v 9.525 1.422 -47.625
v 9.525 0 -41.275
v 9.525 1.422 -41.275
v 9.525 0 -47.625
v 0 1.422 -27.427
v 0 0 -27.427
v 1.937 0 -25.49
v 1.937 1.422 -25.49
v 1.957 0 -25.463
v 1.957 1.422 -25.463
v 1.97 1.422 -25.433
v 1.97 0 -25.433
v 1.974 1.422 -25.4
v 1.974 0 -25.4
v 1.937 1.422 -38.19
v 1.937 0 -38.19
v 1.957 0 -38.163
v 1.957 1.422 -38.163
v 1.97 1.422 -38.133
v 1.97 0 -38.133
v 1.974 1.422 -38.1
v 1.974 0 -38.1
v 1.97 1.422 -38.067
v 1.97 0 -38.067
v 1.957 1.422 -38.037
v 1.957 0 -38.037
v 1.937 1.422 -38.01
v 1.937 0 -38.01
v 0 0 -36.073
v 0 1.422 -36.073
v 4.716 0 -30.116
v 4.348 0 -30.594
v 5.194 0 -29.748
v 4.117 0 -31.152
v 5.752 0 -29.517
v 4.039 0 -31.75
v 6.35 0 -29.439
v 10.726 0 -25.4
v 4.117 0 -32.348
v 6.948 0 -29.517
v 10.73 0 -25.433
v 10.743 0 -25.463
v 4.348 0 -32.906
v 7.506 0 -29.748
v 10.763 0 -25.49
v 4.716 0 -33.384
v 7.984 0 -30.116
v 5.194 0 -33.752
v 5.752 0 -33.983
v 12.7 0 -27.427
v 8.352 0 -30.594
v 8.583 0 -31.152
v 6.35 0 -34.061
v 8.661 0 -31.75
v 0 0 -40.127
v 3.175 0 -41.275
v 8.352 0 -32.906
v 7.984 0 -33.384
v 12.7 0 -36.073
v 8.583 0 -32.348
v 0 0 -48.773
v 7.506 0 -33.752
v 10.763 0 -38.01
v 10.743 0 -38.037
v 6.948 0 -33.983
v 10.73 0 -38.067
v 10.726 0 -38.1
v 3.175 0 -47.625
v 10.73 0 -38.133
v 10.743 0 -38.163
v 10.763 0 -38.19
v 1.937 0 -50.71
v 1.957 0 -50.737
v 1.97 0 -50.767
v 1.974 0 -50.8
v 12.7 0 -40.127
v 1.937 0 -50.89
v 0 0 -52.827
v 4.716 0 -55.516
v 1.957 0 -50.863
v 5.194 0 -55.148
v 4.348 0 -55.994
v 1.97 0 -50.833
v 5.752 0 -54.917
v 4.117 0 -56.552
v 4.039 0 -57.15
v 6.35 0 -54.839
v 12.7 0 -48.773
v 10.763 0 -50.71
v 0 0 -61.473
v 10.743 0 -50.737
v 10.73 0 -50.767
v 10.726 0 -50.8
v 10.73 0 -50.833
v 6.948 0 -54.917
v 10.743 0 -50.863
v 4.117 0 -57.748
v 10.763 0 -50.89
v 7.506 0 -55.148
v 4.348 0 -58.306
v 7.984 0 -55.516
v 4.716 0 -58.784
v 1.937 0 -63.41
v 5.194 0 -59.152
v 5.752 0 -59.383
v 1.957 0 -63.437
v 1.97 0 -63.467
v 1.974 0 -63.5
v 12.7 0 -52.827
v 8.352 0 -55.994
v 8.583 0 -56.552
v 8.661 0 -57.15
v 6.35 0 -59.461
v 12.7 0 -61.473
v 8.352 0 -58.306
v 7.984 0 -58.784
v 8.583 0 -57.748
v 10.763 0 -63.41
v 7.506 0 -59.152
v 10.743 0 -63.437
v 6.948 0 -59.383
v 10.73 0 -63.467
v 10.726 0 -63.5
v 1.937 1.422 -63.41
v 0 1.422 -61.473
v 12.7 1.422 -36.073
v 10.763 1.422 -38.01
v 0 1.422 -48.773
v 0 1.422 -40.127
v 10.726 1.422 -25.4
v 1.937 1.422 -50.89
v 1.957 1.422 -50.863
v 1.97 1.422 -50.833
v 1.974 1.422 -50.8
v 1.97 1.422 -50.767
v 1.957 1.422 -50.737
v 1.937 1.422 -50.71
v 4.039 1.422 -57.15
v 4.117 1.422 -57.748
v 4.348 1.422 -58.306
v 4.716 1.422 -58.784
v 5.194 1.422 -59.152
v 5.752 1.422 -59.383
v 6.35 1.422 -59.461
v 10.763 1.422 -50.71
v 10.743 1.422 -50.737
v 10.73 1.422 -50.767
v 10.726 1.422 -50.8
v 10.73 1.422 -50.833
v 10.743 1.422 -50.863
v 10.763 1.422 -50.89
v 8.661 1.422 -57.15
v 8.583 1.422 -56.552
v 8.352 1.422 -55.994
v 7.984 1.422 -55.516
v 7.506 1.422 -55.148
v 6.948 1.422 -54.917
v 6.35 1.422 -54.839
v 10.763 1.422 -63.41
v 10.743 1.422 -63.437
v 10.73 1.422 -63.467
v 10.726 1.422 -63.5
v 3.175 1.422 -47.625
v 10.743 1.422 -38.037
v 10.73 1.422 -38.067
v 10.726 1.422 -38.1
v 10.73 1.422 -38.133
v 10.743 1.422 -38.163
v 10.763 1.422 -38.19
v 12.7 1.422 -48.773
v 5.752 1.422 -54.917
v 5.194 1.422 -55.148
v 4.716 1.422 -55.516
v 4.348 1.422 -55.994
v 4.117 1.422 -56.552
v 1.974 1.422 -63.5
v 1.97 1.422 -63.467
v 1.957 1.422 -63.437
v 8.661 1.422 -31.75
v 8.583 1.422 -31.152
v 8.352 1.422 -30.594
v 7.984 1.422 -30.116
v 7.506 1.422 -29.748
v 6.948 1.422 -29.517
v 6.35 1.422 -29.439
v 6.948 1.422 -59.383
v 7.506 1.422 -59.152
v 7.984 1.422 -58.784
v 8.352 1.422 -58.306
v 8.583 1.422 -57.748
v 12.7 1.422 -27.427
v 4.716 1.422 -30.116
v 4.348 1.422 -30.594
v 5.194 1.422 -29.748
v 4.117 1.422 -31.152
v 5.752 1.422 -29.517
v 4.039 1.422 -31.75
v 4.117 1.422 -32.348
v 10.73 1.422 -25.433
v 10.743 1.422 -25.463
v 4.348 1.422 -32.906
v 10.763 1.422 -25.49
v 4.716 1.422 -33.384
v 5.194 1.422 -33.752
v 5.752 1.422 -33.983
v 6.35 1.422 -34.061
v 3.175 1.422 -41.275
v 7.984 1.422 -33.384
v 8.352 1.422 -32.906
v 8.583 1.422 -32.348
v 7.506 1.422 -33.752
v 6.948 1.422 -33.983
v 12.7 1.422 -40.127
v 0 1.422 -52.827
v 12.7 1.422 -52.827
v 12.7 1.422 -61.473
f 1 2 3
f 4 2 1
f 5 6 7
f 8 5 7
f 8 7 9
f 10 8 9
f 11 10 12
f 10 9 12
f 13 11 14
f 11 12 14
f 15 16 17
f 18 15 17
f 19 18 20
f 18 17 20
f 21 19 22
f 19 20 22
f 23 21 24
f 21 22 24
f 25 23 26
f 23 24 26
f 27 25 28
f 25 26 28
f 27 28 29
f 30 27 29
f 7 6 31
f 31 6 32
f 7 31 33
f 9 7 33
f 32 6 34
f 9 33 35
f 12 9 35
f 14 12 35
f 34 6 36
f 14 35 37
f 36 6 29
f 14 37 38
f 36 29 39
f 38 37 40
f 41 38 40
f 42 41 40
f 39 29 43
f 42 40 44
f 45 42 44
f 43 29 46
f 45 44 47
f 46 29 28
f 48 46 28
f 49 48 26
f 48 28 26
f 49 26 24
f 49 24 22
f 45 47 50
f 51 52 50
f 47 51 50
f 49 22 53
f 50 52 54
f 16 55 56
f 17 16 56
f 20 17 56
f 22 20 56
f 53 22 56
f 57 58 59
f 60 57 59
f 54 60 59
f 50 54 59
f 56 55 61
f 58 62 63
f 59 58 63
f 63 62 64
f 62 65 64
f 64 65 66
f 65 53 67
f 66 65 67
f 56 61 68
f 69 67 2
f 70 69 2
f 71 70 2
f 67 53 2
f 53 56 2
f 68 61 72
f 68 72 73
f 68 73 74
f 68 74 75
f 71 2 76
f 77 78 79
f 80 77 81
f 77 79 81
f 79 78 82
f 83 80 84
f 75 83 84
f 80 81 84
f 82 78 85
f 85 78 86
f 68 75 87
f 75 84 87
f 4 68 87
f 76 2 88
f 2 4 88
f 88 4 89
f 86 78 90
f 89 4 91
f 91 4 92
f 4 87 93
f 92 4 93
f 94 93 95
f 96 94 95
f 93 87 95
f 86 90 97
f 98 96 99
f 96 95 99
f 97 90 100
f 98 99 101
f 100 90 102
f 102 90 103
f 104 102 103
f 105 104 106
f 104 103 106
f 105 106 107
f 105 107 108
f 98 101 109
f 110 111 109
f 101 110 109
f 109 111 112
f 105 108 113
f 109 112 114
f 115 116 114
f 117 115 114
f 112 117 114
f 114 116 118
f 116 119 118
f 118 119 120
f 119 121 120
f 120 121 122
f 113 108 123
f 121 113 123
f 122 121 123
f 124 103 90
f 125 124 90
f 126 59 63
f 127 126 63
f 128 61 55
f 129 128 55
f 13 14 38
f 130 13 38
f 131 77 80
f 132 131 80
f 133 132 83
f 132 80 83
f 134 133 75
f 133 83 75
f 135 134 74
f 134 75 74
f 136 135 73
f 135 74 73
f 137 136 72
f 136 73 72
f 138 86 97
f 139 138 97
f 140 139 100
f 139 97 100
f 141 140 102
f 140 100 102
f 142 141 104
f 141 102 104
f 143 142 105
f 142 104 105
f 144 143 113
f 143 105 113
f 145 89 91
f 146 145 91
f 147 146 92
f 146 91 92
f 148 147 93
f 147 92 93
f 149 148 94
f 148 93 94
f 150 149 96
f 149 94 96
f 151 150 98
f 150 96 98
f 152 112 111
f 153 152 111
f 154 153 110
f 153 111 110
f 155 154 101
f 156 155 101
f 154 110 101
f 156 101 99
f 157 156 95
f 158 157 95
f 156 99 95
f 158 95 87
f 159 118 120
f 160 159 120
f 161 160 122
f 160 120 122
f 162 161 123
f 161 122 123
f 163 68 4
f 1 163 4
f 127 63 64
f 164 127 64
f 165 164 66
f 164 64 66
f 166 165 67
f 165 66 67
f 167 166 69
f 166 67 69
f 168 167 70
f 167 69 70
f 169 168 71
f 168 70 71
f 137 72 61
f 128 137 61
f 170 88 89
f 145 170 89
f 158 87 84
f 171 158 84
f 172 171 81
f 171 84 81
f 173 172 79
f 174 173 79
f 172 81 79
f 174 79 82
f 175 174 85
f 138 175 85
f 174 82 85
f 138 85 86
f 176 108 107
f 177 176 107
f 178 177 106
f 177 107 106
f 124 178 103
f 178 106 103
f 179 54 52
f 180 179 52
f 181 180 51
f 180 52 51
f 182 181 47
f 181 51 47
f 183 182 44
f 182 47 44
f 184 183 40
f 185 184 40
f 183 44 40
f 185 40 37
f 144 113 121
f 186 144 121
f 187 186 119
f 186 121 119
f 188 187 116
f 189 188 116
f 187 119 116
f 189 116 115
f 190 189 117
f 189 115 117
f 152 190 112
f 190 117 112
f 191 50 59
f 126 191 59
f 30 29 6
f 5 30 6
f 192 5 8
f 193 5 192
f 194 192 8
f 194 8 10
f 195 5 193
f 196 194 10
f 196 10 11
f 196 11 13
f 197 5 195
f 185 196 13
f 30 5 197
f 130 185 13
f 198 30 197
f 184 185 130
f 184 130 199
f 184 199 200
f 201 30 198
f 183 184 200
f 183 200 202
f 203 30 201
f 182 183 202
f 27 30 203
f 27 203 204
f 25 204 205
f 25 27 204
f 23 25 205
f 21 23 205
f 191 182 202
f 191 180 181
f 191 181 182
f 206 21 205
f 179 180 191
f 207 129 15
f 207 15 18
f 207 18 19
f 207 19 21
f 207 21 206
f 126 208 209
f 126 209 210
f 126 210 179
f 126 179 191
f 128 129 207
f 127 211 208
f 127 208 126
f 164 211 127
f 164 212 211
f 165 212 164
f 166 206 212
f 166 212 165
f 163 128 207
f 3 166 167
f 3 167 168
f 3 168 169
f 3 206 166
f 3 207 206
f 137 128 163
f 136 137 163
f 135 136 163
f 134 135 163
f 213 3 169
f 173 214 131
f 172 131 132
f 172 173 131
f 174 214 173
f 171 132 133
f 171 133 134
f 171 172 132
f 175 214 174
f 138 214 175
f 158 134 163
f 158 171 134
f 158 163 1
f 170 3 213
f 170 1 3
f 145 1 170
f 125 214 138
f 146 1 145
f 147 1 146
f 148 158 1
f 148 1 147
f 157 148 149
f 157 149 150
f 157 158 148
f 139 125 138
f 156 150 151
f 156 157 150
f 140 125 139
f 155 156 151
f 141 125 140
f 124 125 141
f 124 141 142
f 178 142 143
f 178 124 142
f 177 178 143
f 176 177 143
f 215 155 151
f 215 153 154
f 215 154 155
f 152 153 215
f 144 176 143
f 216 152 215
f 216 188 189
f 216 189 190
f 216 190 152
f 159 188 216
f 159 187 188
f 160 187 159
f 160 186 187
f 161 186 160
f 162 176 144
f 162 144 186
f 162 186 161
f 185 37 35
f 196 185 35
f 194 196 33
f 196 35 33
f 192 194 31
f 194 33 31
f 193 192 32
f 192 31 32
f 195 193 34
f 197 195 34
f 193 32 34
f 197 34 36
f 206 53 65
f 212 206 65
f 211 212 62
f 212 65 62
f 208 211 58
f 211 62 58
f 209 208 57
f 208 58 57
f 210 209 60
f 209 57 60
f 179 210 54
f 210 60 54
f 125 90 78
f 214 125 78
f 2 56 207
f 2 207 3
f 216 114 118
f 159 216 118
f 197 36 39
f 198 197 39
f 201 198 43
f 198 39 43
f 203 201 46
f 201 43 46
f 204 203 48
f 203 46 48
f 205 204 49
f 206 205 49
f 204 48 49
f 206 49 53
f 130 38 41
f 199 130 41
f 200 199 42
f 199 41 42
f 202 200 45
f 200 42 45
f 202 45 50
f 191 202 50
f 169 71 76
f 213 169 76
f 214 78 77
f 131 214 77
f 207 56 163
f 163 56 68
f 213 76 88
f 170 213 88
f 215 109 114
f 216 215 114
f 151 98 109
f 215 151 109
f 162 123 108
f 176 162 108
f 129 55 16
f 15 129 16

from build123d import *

# Parameters (mm, degrees)
STOCK_HS_LOCK_BAR_3_LONG_1_OUTLINE_W = 6.35
STOCK_HS_LOCK_BAR_3_LONG_1_OUTLINE_H = 6.35
STOCK_HS_LOCK_BAR_3_LONG_1_DEPTH     = 1.4224
BOSS_EXTRUDE1_START                  = -1.4224
BOSS_EXTRUDE1_DEPTH                  = 1.4224


# Read off the part's stored shape, not the designer's step: Stock-HS lock bar 3 long-1
with BuildPart() as part:
    # Stock-HS lock bar 3 long-1 outline → Stock-HS lock bar 3 long-1 (new body)
    with BuildSketch(Plane(origin=(0, 0, 0), x_dir=(1, 0, 0), z_dir=(0, 1, 0))):
        with BuildLine():
            Line((12.7, 36.073014945), (10.762817506, 38.010197439))
            ThreePointArc((10.762817506, 38.010197439), (10.725620068, 38.1), (10.762817506, 38.189802561))
            Line((10.762817506, 38.189802561), (12.7, 40.126985055))
            Line((12.7, 40.126985055), (12.7, 48.773014945))
            Line((12.7, 48.773014945), (10.762817506, 50.710197439))
            ThreePointArc((10.762817506, 50.710197439), (10.725620068, 50.8), (10.762817506, 50.889802561))
            Line((10.762817506, 50.889802561), (12.7, 52.826985055))
            Line((12.7, 52.826985055), (12.7, 61.473014945))
            Line((12.7, 61.473014945), (10.762817506, 63.410197439))
            ThreePointArc((10.762817506, 63.410197439), (10.735287367, 63.451399204), (10.725620068, 63.5))
            Line((10.725620068, 63.5), (1.974379932, 63.5))
            ThreePointArc((1.974379932, 63.5), (1.964712633, 63.451399204), (1.937182494, 63.410197439))
            Line((1.937182494, 63.410197439), (0, 61.473014945))
            Line((0, 61.473014945), (0, 52.826985055))
            Line((0, 52.826985055), (1.937182494, 50.889802561))
            ThreePointArc((1.937182494, 50.889802561), (1.974379932, 50.8), (1.937182494, 50.710197439))
            Line((1.937182494, 50.710197439), (0, 48.773014945))
            Line((0, 48.773014945), (0, 40.126985055))
            Line((0, 40.126985055), (1.937182494, 38.189802561))
            ThreePointArc((1.937182494, 38.189802561), (1.974379932, 38.1), (1.937182494, 38.010197439))
            Line((1.937182494, 38.010197439), (0, 36.073014945))
            Line((0, 36.073014945), (0, 27.426985055))
            Line((0, 27.426985055), (1.937182494, 25.489802561))
            ThreePointArc((1.937182494, 25.489802561), (1.964712633, 25.448600796), (1.974379932, 25.4))
            Line((1.974379932, 25.4), (10.725620068, 25.4))
            ThreePointArc((10.725620068, 25.4), (10.735287367, 25.448600796), (10.762817506, 25.489802561))
            Line((10.762817506, 25.489802561), (12.7, 27.426985055))
            Line((12.7, 27.426985055), (12.7, 36.073014945))
        make_face()
        with BuildLine():
            Line((4.0386, 29.9466), (4.0386, 33.5534))
            ThreePointArc((4.0386, 33.5534), (4.187389755, 33.912610245), (4.5466, 34.0614))
            Line((4.5466, 34.0614), (8.1534, 34.0614))
            ThreePointArc((8.1534, 34.0614), (8.512610245, 33.912610245), (8.6614, 33.5534))
            Line((8.6614, 33.5534), (8.6614, 29.9466))
            ThreePointArc((8.6614, 29.9466), (8.512610245, 29.587389755), (8.1534, 29.4386))
            Line((8.1534, 29.4386), (4.5466, 29.4386))
            ThreePointArc((4.5466, 29.4386), (4.187389755, 29.587389755), (4.0386, 29.9466))
        make_face(mode=Mode.SUBTRACT)
        with Locations((6.35, 44.45)):
            Rectangle(STOCK_HS_LOCK_BAR_3_LONG_1_OUTLINE_W, STOCK_HS_LOCK_BAR_3_LONG_1_OUTLINE_H, mode=Mode.SUBTRACT)
        with BuildLine():
            Line((4.0386, 55.3466), (4.0386, 58.9534))
            ThreePointArc((4.0386, 58.9534), (4.187389755, 59.312610245), (4.5466, 59.4614))
            Line((4.5466, 59.4614), (8.1534, 59.4614))
            ThreePointArc((8.1534, 59.4614), (8.512610245, 59.312610245), (8.6614, 58.9534))
            Line((8.6614, 58.9534), (8.6614, 55.3466))
            ThreePointArc((8.6614, 55.3466), (8.512610245, 54.987389755), (8.1534, 54.8386))
            Line((8.1534, 54.8386), (4.5466, 54.8386))
            ThreePointArc((4.5466, 54.8386), (4.187389755, 54.987389755), (4.0386, 55.3466))
        make_face(mode=Mode.SUBTRACT)
    extrude(amount=STOCK_HS_LOCK_BAR_3_LONG_1_DEPTH)

    # Sketch1 → Boss-Extrude1 (add)
    with BuildSketch(Plane(origin=(0, 1.4224, 0), x_dir=(1, 0, 0), z_dir=(0, 1, 0)).offset(BOSS_EXTRUDE1_START)):
        with BuildLine():
            Line((4.0386, 33.5534), (4.0386, 31.75))
            ThreePointArc((4.0386, 31.75), (4.715593386, 33.384406614), (6.35, 34.0614))
            Line((6.35, 34.0614), (4.5466, 34.0614))
            ThreePointArc((4.5466, 34.0614), (4.187389755, 33.912610245), (4.0386, 33.5534))
        make_face()
        with BuildLine():
            Line((8.1534, 34.0614), (6.35, 34.0614))
            ThreePointArc((6.35, 34.0614), (7.984406614, 33.384406614), (8.6614, 31.75))
            Line((8.6614, 31.75), (8.6614, 33.5534))
            ThreePointArc((8.6614, 33.5534), (8.512610245, 33.912610245), (8.1534, 34.0614))
        make_face()
        with BuildLine():
            ThreePointArc((8.6614, 31.75), (7.984406614, 30.115593386), (6.35, 29.4386))
            Line((6.35, 29.4386), (8.1534, 29.4386))
            ThreePointArc((8.1534, 29.4386), (8.512610245, 29.587389755), (8.6614, 29.9466))
            Line((8.6614, 29.9466), (8.6614, 31.75))
        make_face()
        with BuildLine():
            Line((4.0386, 31.75), (4.0386, 29.9466))
            ThreePointArc((4.0386, 29.9466), (4.187389755, 29.587389755), (4.5466, 29.4386))
            Line((4.5466, 29.4386), (6.35, 29.4386))
            ThreePointArc((6.35, 29.4386), (4.715593386, 30.115593386), (4.0386, 31.75))
        make_face()
        with BuildLine():
            ThreePointArc((8.6614, 57.15), (7.984406614, 55.515593386), (6.35, 54.8386))
            Line((6.35, 54.8386), (8.1534, 54.8386))
            ThreePointArc((8.1534, 54.8386), (8.512610245, 54.987389755), (8.6614, 55.3466))
            Line((8.6614, 55.3466), (8.6614, 57.15))
        make_face()
        with BuildLine():
            ThreePointArc((4.0386, 55.3466), (4.187389755, 54.987389755), (4.5466, 54.8386))
            Line((4.5466, 54.8386), (6.35, 54.8386))
            ThreePointArc((6.35, 54.8386), (4.715593386, 55.515593386), (4.0386, 57.15))
            Line((4.0386, 57.15), (4.0386, 55.3466))
        make_face()
        with BuildLine():
            ThreePointArc((6.350000002, 59.4614), (7.984406615, 58.784406613), (8.6614, 57.15))
            Line((8.6614, 57.15), (8.6614, 58.9534))
            ThreePointArc((8.6614, 58.9534), (8.512610245, 59.312610245), (8.1534, 59.4614))
            Line((8.1534, 59.4614), (6.350000002, 59.4614))
        make_face()
        with BuildLine():
            Line((4.0386, 58.9534), (4.0386, 57.15))
            ThreePointArc((4.0386, 57.15), (4.715593387, 58.784406615), (6.350000002, 59.4614))
            Line((6.350000002, 59.4614), (4.5466, 59.4614))
            ThreePointArc((4.5466, 59.4614), (4.187389755, 59.312610245), (4.0386, 58.9534))
        make_face()
    extrude(amount=BOSS_EXTRUDE1_DEPTH)


solid = part.part
